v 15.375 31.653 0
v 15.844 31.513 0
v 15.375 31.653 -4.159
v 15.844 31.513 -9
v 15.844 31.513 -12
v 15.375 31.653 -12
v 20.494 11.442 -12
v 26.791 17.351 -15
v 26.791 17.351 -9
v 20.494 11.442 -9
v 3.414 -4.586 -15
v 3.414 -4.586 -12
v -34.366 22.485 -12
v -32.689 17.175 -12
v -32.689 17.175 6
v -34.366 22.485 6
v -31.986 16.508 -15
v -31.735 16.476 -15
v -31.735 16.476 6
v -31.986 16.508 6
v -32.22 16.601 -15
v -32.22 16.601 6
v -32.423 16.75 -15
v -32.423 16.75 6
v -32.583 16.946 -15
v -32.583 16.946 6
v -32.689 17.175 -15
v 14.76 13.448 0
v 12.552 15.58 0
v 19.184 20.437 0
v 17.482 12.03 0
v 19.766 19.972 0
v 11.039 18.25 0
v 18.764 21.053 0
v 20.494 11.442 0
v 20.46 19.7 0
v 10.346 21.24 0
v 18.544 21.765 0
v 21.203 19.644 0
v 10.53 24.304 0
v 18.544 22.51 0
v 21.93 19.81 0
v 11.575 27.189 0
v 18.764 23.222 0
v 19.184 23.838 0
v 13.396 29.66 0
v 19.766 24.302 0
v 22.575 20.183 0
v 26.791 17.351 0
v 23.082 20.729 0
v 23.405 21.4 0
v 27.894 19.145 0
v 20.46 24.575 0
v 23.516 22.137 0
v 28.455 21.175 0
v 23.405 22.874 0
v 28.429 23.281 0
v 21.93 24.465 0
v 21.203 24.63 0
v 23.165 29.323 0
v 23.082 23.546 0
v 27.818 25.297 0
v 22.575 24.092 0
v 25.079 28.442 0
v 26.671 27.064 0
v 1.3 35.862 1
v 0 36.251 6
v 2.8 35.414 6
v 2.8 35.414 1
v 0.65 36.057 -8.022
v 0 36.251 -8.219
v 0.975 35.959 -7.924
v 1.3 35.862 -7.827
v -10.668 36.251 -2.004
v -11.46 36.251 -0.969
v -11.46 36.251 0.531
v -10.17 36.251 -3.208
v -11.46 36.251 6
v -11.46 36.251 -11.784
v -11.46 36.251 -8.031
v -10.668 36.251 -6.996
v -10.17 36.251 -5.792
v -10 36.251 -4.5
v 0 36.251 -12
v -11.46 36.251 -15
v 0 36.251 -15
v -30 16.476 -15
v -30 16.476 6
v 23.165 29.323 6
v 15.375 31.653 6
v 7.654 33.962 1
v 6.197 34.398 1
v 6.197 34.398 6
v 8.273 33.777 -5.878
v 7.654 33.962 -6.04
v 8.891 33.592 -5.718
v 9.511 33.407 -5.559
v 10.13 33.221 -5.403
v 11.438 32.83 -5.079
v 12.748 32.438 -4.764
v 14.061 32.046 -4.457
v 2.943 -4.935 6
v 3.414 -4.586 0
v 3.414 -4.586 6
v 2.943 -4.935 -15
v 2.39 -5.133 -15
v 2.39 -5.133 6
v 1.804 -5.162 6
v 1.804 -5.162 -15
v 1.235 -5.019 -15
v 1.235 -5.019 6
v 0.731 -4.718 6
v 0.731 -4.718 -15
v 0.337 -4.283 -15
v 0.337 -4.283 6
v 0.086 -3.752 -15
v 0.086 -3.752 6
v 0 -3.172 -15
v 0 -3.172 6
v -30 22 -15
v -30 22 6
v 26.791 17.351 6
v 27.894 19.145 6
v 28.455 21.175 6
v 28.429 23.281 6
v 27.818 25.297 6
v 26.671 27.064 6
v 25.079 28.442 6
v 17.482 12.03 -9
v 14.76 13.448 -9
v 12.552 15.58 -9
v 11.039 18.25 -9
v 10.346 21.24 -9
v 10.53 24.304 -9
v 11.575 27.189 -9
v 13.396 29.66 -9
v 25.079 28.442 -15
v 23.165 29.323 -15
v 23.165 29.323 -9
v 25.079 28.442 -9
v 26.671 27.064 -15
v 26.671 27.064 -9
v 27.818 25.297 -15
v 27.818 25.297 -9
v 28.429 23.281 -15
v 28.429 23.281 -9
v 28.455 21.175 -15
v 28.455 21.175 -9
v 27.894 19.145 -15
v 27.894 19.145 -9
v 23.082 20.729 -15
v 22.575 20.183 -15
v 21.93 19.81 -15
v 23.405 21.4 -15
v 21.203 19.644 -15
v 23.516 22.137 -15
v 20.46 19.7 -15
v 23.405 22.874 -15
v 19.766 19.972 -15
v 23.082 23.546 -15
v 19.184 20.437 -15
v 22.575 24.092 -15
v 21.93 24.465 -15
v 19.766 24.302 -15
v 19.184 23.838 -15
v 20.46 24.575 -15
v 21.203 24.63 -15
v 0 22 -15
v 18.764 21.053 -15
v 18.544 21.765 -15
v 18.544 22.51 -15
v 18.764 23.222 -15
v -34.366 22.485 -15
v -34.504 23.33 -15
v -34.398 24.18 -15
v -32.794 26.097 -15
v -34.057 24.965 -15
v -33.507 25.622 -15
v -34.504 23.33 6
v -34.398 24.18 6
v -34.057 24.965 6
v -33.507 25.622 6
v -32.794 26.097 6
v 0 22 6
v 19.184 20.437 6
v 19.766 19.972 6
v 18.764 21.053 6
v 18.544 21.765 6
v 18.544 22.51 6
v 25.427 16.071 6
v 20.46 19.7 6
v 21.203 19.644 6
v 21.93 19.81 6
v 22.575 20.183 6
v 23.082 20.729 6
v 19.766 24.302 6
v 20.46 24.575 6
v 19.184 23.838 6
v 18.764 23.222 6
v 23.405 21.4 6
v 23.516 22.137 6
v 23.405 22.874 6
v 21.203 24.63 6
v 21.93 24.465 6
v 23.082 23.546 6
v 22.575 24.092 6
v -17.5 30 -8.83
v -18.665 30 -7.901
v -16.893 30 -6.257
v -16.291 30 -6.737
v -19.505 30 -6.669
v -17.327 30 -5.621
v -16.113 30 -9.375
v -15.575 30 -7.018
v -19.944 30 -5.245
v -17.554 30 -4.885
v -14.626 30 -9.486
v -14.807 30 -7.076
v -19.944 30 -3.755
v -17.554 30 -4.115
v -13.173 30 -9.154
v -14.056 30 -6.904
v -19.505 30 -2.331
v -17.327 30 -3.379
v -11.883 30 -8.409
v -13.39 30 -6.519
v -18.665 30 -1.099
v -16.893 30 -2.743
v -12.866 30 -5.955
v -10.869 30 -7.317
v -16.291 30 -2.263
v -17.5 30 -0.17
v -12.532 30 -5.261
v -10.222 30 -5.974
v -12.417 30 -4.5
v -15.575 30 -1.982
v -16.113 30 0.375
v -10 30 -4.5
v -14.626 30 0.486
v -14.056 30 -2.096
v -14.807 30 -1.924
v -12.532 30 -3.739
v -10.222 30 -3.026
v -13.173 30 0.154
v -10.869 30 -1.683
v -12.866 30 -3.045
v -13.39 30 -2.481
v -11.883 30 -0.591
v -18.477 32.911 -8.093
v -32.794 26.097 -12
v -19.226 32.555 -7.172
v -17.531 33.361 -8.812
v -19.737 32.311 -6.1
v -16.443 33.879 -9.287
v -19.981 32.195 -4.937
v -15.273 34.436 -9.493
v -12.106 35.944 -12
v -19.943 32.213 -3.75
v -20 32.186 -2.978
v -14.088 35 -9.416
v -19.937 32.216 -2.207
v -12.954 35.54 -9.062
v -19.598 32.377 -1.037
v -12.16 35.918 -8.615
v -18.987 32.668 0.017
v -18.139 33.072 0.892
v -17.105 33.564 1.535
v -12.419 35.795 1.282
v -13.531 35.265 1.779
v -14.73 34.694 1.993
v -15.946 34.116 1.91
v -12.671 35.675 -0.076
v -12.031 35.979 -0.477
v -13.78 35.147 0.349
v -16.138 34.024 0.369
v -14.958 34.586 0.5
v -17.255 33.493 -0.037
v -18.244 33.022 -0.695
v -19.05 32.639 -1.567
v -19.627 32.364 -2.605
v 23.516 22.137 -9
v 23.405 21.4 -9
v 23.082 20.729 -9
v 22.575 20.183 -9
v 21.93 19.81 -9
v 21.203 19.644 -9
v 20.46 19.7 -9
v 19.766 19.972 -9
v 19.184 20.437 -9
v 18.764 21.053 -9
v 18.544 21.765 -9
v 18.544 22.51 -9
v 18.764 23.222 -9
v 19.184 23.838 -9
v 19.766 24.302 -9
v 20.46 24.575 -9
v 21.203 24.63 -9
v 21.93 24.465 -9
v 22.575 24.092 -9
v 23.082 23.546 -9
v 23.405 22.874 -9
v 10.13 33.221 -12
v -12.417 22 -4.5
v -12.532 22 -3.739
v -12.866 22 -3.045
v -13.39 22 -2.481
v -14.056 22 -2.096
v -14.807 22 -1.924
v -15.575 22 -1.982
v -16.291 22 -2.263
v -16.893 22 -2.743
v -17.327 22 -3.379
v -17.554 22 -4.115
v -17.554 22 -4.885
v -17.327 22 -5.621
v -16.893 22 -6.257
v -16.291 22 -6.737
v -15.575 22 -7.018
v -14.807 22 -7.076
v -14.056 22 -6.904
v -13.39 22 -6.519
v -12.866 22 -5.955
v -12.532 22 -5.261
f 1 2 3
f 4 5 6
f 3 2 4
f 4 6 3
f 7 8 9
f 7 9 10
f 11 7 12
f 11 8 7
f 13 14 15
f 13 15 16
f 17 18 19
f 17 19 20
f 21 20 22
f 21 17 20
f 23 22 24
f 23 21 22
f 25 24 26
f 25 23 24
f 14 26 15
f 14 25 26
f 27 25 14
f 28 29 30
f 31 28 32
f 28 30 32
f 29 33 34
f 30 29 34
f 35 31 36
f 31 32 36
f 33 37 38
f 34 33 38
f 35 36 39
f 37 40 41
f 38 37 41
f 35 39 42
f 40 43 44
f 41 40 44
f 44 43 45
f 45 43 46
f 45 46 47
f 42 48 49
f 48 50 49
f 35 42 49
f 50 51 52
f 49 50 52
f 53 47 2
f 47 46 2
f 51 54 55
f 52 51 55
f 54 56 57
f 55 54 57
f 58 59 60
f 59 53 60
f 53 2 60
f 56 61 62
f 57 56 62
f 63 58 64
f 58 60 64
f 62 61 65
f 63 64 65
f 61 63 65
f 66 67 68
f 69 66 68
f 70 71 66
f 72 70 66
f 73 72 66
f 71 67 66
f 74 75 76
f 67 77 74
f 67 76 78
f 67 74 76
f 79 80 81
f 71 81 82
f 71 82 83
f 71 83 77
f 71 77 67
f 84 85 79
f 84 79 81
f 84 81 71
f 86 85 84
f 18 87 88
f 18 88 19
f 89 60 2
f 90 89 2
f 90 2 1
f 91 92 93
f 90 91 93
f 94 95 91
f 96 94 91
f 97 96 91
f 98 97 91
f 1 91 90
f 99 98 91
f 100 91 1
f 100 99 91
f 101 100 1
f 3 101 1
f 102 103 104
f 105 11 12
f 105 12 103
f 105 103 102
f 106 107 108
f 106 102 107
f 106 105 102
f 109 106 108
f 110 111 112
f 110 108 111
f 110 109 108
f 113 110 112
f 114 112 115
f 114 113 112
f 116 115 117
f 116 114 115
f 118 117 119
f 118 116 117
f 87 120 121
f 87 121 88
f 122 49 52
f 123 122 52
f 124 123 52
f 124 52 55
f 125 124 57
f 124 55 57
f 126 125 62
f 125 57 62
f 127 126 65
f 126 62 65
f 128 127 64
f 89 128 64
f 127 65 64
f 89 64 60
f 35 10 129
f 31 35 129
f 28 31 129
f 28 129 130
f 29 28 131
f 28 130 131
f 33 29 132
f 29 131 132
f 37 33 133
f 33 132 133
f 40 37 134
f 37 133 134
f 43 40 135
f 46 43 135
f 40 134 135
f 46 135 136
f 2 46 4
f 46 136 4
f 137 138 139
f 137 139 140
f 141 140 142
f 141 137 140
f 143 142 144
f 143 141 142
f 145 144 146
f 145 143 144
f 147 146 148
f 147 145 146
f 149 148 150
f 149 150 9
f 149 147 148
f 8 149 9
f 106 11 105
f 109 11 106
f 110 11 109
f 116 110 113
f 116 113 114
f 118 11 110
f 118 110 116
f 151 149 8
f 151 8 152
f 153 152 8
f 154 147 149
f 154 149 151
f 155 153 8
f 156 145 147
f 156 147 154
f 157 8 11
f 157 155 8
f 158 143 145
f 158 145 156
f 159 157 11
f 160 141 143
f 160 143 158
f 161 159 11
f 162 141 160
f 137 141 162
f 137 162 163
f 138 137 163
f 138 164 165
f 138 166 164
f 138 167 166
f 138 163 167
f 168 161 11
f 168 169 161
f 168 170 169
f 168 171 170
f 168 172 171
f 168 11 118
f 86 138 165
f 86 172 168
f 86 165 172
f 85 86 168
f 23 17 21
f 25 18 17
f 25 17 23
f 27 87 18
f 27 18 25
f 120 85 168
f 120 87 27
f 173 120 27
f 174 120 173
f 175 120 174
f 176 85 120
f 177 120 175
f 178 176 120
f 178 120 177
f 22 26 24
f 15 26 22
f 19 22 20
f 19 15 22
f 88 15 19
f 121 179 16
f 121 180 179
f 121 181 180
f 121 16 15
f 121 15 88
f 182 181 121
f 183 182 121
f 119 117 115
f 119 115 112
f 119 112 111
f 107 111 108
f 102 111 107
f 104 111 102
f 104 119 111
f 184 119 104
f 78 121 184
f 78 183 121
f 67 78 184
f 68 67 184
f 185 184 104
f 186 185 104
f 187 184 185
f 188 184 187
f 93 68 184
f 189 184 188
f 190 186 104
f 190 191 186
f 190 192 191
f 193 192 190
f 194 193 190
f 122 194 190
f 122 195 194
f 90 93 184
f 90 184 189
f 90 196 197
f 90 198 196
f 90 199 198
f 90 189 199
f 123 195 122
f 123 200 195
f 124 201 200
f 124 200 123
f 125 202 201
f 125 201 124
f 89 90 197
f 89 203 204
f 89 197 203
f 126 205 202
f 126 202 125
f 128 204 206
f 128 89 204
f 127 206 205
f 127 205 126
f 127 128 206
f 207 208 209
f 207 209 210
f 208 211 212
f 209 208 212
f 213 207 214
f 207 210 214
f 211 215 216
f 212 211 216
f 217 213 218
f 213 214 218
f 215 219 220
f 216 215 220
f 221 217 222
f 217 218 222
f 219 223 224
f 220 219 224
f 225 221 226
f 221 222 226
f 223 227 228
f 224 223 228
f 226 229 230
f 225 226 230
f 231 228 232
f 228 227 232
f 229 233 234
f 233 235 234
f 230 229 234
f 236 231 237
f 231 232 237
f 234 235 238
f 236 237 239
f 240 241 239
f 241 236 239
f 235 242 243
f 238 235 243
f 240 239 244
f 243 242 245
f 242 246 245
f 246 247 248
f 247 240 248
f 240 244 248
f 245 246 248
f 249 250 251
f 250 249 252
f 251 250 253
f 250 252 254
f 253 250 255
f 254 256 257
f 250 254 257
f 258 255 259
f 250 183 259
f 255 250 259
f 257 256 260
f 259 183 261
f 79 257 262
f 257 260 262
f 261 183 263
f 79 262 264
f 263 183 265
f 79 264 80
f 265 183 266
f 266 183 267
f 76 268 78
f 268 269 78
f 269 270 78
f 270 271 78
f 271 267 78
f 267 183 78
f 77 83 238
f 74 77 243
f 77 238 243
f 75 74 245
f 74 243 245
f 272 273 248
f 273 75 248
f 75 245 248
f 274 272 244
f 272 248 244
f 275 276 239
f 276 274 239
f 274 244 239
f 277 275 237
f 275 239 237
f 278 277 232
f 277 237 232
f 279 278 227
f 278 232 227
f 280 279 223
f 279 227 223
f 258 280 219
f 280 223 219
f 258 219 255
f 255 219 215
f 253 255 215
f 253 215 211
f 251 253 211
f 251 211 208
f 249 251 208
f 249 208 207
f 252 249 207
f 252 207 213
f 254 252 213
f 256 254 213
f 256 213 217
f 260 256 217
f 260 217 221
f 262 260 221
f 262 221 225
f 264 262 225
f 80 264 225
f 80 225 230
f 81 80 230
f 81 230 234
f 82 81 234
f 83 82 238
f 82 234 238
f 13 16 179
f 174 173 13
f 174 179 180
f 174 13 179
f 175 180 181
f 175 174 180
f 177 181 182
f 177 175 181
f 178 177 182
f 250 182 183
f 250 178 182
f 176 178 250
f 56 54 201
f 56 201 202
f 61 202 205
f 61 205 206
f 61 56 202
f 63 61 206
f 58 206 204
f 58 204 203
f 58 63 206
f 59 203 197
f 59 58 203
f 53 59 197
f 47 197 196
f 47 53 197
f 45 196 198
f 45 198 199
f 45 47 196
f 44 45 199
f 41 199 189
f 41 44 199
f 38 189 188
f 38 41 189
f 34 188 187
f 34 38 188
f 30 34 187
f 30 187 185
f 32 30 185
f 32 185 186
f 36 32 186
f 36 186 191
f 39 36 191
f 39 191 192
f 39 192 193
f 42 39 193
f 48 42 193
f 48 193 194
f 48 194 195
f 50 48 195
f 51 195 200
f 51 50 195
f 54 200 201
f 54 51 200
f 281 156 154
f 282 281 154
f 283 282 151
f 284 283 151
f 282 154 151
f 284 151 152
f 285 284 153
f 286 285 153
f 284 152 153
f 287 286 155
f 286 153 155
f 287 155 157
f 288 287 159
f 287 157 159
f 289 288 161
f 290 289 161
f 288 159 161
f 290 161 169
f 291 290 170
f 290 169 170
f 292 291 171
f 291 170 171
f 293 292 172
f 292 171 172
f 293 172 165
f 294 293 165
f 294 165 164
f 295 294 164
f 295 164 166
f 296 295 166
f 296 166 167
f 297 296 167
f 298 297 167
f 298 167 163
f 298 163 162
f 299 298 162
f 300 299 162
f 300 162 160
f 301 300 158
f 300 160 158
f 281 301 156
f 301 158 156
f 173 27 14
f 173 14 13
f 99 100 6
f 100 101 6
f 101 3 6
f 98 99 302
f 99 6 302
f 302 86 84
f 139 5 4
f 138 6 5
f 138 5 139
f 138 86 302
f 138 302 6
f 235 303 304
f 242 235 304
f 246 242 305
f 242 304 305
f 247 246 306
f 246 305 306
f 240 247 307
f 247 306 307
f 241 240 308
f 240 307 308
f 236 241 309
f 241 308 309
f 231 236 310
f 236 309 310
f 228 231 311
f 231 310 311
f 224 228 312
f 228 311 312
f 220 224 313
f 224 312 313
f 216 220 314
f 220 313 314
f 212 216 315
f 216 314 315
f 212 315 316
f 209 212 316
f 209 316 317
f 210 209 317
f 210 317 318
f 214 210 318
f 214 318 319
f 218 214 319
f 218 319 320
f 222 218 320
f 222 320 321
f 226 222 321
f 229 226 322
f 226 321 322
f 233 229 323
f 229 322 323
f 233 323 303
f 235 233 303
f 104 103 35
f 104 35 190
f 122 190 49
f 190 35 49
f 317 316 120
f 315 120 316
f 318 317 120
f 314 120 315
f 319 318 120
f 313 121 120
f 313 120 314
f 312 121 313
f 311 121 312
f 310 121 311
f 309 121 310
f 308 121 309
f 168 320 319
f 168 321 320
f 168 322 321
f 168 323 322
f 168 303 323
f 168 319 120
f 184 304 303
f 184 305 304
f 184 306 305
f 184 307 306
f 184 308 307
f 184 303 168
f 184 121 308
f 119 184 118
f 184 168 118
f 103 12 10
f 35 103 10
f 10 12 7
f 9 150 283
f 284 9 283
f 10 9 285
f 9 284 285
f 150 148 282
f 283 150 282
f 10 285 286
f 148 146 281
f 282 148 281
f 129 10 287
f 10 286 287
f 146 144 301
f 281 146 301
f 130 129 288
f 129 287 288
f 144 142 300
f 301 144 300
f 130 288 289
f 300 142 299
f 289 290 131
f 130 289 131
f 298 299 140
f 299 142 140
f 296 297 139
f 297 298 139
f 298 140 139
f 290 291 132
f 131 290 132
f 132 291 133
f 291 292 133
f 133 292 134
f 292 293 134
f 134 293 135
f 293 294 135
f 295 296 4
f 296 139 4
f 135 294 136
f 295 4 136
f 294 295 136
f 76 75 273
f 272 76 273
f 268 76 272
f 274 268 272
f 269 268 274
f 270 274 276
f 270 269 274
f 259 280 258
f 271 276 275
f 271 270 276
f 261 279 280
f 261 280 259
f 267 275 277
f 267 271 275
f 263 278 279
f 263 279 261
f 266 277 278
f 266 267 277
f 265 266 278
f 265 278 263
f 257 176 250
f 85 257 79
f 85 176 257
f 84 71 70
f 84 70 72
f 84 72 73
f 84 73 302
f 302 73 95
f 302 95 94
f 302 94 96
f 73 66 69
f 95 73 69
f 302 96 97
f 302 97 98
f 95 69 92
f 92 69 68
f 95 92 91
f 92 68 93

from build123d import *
from build123d.topology import SkipClean

# Parameters (mm, degrees)
RESSALTO_EXTRUS_O1_DEPTH     = 6
RESSALTO_EXTRUS_O2_DEPTH     = 47.171573
CORTE_EXTRUS_O1_START        = -36
CORTE_EXTRUS_O1_DEPTH        = 36
CORTE_EXTRUS_O2_START        = -6
CORTE_EXTRUS_O2_DEPTH        = 6
CORTE_EXTRUS_O3_DEPTH        = 64.000000167
ESBO_O6_R                    = 2.75
CORTE_EXTRUS_O4_DEPTH        = 54.872946739
ESBO_O7_R                    = 5
CORTE_EXTRUS_O5_DEPTH        = 16
RESSALTO_EXTRUS_O3_DEPTH     = 56
CORTE_EXTRUS_O6_DEPTH        = 56
ESBO_O10_W                   = 30
ESBO_O10_H                   = 4.954017116
CORTE_EXTRUS_O7_DEPTH        = 56
ESBO_O11_W                   = 2.729993951
ESBO_O11_H                   = 30
CORTE_EXTRUS_O8_DEPTH        = 56
ESBO_O12_W                   = 4.187219241
ESBO_O12_H                   = 30
CORTE_EXTRUS_O9_DEPTH        = 56
ESBO_O13_R                   = 7.968110823
CORTE_EXTRUS_O10_DEPTH       = 56
FILETE1_R                    = 3
CORTE_EXTRUS_O11_OUTLINE_R   = 5
CORTE_EXTRUS_O11_DEPTH       = 11.574929357
CORTE_EXTRUS_O11_START       = -21
CORTE_EXTRUS_O11_2_DEPTH     = 28
CORTE_EXTRUS_O12_DEPTH       = 65.838260479
ESBO_O16_R                   = 2.5
RESSALTO_EXTRUS_O4_DEPTH     = 6
RESSALTO_EXTRUS_O5_DEPTH     = 32
CORTE_EXTRUS_O13_DEPTH       = 68.468511346
CORTE_EXTRUS_O13_DEPTH_BACK  = 68.468511346
RESSALTO_EXTRUS_O6_START     = -12
RESSALTO_EXTRUS_O6_OUTLINE_R = 2.5
RESSALTO_EXTRUS_O6_DEPTH     = 6
CORTE_EXTRUS_O14_START       = -6
CORTE_EXTRUS_O14_DEPTH       = 6
RESSALTO_EXTRUS_O7_START     = 12
RESSALTO_EXTRUS_O7_DEPTH     = 12
ESBO_O22_R                   = 45.252609104
CORTE_EXTRUS_O15_DEPTH       = 12
RESSALTO_EXTRUS_O8_START     = 6
ESBO_O23_R                   = 2.5
RESSALTO_EXTRUS_O8_DEPTH     = 6
RESSALTO_EXTRUS_O9_DEPTH     = 6
RESSALTO_EXTRUS_O10_REACH    = 56.275
ESBO_O26_R                   = 5
CORTE_EXTRUS_O16_DEPTH       = 47.409919189
ESBO_O27_R                   = 5
ESBO_O27_R_2                 = 2.582746485
RESSALTO_EXTRUS_O11_DEPTH    = 8


with BuildPart() as part:
    # Esboço1 → Ressalto-extrusão1 (new body)
    with BuildSketch(Plane.XY):
        with BuildLine():
            Line((-30, 24), (-2.375117905, 40.574929257))
            ThreePointArc((-2.375117905, 40.574929257), (0.100503831, 41.637149282), (2.769839649, 42))
            Line((2.769839649, 42), (40, 42))
            ThreePointArc((40, 42), (41.414213562, 41.414213562), (42, 40))
            Line((42, 40), (42, 34.828427125))
            ThreePointArc((42, 34.828427125), (41.847759065, 34.06306026), (41.414213562, 33.414213562))
            Line((41.414213562, 33.414213562), (36.670641482, 28.670641482))
            ThreePointArc((36.670641482, 28.670641482), (31.432958847, 25.911210894), (25.552715472, 26.597151419))
            ThreePointArc((25.552715472, 26.597151419), (13.045048712, 24.264475098), (10.712372391, 11.756808337))
            ThreePointArc((10.712372391, 11.756808337), (11.398312916, 5.876564962), (8.638882328, 0.638882328))
            Line((8.638882328, 0.638882328), (8, 0))
            Line((8, 0), (6.2, -1.8))
            Line((6.2, -1.8), (3.414213562, -4.585786438))
            ThreePointArc((3.414213562, -4.585786438), (1.234633135, -5.01933194), (0, -3.171572875))
            Line((0, -3.171572875), (0, 0))
            Line((0, 0), (0, 22))
            Line((0, 22), (-30, 22))
            Line((-30, 22), (-30, 24))
        make_face()
        with BuildLine():
            Line((6.2, 37.5), (6.2, 34.5))
            ThreePointArc((6.2, 34.5), (4.5, 32.8), (2.8, 34.5))
            Line((2.8, 34.5), (2.8, 37.5))
            ThreePointArc((2.8, 37.5), (4.5, 39.2), (6.2, 37.5))
        make_face(mode=Mode.SUBTRACT)
        with BuildLine():
            Line((39.2, 37.5), (39.2, 35.5))
            ThreePointArc((39.2, 35.5), (37.5, 33.8), (35.8, 35.5))
            Line((35.8, 35.5), (35.8, 37.5))
            ThreePointArc((35.8, 37.5), (37.5, 39.2), (39.2, 37.5))
        make_face(mode=Mode.SUBTRACT)
        with BuildLine():
            Line((6.2, 3.5), (6.2, 1.5))
            ThreePointArc((6.2, 1.5), (4.5, -0.2), (2.8, 1.5))
            Line((2.8, 1.5), (2.8, 3.5))
            ThreePointArc((2.8, 3.5), (4.5, 5.2), (6.2, 3.5))
        make_face(mode=Mode.SUBTRACT)
    extrude(amount=RESSALTO_EXTRUS_O1_DEPTH)

    # Esboço2 → Ressalto-extrusão2 (add, through all)
    with BuildSketch(Plane(origin=(0, 42, 0), x_dir=(1, 0, 0), z_dir=(0, 1, 0))):
        with BuildLine():
            Line((-30, 0), (-30, 20))
            ThreePointArc((-30, 20), (5.092783278, 6.734019802), (42, 0))
            Line((42, 0), (-30, 0))
        make_face()
    extrude(amount=-RESSALTO_EXTRUS_O2_DEPTH)

    # Esboço3 → Corte-extrusão1 (cut)
    with BuildSketch(Plane.XY.offset(CORTE_EXTRUS_O1_START)):
        with BuildLine():
            ThreePointArc((2.8, 34.5), (4.5, 32.8), (6.2, 34.5))
            Line((6.2, 34.5), (6.2, 37.5))
            ThreePointArc((6.2, 37.5), (4.5, 39.2), (2.8, 37.5))
            Line((2.8, 37.5), (2.8, 34.5))
        make_face()
        with BuildLine():
            Line((0, -3.171572875), (0, 22))
            Line((0, 22), (-30, 22))
            Line((-30, 22), (-30, -5.171572875))
            Line((-30, -5.171572875), (2, -5.171572875))
            ThreePointArc((2, -5.171572875), (0.585786438, -4.585786438), (0, -3.171572875))
        make_face()
        with BuildLine():
            ThreePointArc((3.414213562, -4.585786438), (2.765366865, -5.01933194), (2, -5.171572875))
            Line((2, -5.171572875), (42, -5.171572875))
            Line((42, -5.171572875), (42, 34.828427125))
            ThreePointArc((42, 34.828427125), (41.847759065, 34.06306026), (41.414213562, 33.414213562))
            Line((41.414213562, 33.414213562), (36.670641482, 28.670641482))
            ThreePointArc((36.670641482, 28.670641482), (31.432958847, 25.911210894), (25.552715472, 26.597151419))
            ThreePointArc((25.552715472, 26.597151419), (13.045048712, 24.264475098), (10.712372391, 11.756808337))
            ThreePointArc((10.712372391, 11.756808337), (11.398312916, 5.876564962), (8.638882328, 0.638882328))
            Line((8.638882328, 0.638882328), (3.414213562, -4.585786438))
        make_face()
        with BuildLine():
            ThreePointArc((35.8, 35.5), (37.5, 33.8), (39.2, 35.5))
            Line((39.2, 35.5), (39.2, 37.5))
            ThreePointArc((39.2, 37.5), (37.5, 39.2), (35.8, 37.5))
            Line((35.8, 37.5), (35.8, 35.5))
        make_face()
        with BuildLine():
            ThreePointArc((2.8, 1.5), (4.5, -0.2), (6.2, 1.5))
            Line((6.2, 1.5), (6.2, 3.5))
            ThreePointArc((6.2, 3.5), (4.5, 5.2), (2.8, 3.5))
            Line((2.8, 3.5), (2.8, 1.5))
        make_face()
        with BuildLine():
            Line((-30, 42), (-30, 24))
            Line((-30, 24), (-2.375117905, 40.574929257))
            ThreePointArc((-2.375117905, 40.574929257), (0.100503831, 41.637149282), (2.769839649, 42))
            Line((2.769839649, 42), (-30, 42))
        make_face()
    extrude(amount=CORTE_EXTRUS_O1_DEPTH, mode=Mode.SUBTRACT)

    # Esboço4 → Corte-extrusão2 (cut)
    with BuildSketch(Plane.XY.offset(CORTE_EXTRUS_O2_START)):
        with BuildLine():
            Line((42, 40), (42, 42))
            Line((42, 42), (40, 42))
            ThreePointArc((40, 42), (41.414213562, 41.414213562), (42, 40))
        make_face()
    extrude(amount=CORTE_EXTRUS_O2_DEPTH, mode=Mode.SUBTRACT)

    # Esboço5 → Corte-extrusão3 (cut, through all)
    with BuildSketch(Plane.XY.offset(1)):
        with BuildLine():
            Line((1.3, 37.5), (1.3, 34.5))
            ThreePointArc((1.3, 34.5), (4.5, 31.3), (7.7, 34.5))
            Line((7.7, 34.5), (7.7, 37.5))
            ThreePointArc((7.7, 37.5), (4.5, 40.7), (1.3, 37.5))
        make_face()
        with BuildLine():
            Line((40.2, 35.5), (40.2, 37.5))
            ThreePointArc((40.2, 37.5), (37.5, 40.2), (34.8, 37.5))
            Line((34.8, 37.5), (34.8, 35.5))
            ThreePointArc((34.8, 35.5), (37.5, 32.8), (40.2, 35.5))
        make_face()
        with BuildLine():
            Line((1.8, 3.5), (1.8, 1.5))
            ThreePointArc((1.8, 1.5), (4.5, -1.2), (7.2, 1.5))
            Line((7.2, 1.5), (7.2, 3.5))
            ThreePointArc((7.2, 3.5), (4.5, 6.2), (1.8, 3.5))
        make_face()
    extrude(amount=-CORTE_EXTRUS_O3_DEPTH, mode=Mode.SUBTRACT)

    # Esboço6 → Corte-extrusão4 (cut, through all)
    with BuildSketch(Plane.XZ.offset(-22)):
        with Locations((-15, -3)):
            Circle(ESBO_O6_R)
    extrude(amount=-CORTE_EXTRUS_O4_DEPTH, mode=Mode.SUBTRACT)

    # Esboço7 → Corte-extrusão5 (cut)
    with BuildSketch(Plane(origin=(0, 29, 0), x_dir=(-1, 0, 0), z_dir=(0, -1, 0))):
        with Locations(Location((15, 3, 0), (0, 0, 180))):
            Circle(ESBO_O7_R)
    extrude(amount=-CORTE_EXTRUS_O5_DEPTH, mode=Mode.SUBTRACT)

    # Esboço8 → Ressalto-extrusão3 (add)
    with BuildSketch(Plane.XY.offset(6)):
        Polygon((-30, 22), (-30, 16.475897374), (-32.468121282, 16.475897374), (-35.151943697, 24.974668355), (-2.375117905, 40.574929257), align=None)
    extrude(amount=-RESSALTO_EXTRUS_O3_DEPTH)

    # Esboço9 → Corte-extrusão6 (cut)
    with BuildSketch(Plane(origin=(-19.527562648, 29.041651157, 0), x_dir=(0.8298484461977135, 0.5579888496585221, 0), z_dir=(0.5579888496585221, -0.8298484461977135, 0))):
        with BuildLine():
            Line((20.669370198, -50), (20.669370198, -8.960218673))
            add(Edge.make_bspline(
                [(20.669370198, -8.960218673), (3.547051305, -13.487974371), (-12.619698693, -20)],
                knots=[1.879279318, 1.879279318, 1.879279318, 2.02269118, 2.02269118, 2.02269118], degree=2, weights=[1, 0.997430231, 1]))
            Line((-12.619698693, -20), (-12.619698693, -50))
            Line((-12.619698693, -50), (20.669370198, -50))
        make_face()
    extrude(amount=-CORTE_EXTRUS_O6_DEPTH, mode=Mode.SUBTRACT)

    # Esboço10 → Corte-extrusão7 (cut)
    with BuildSketch(Plane(origin=(-10.472437352, -7.041651157, 0), x_dir=(0, 0, -1), z_dir=(0.8298484461977135, 0.5579888496585221, 1.5073885260129385e-15))):
        with Locations((35, 37.473339864)):
            Rectangle(ESBO_O10_W, ESBO_O10_H)
    extrude(amount=-CORTE_EXTRUS_O7_DEPTH, mode=Mode.SUBTRACT)

    # Esboço11 → Corte-extrusão8 (cut)
    with BuildSketch(Plane(origin=(-22.291848959, 33.152734563, 0), x_dir=(0.8298484461977135, 0.5579888496585221, 0), z_dir=(0.5579888496585221, -0.8298484461977135, 0))):
        with Locations((-13.984695669, -35)):
            Rectangle(ESBO_O11_W, ESBO_O11_H)
    extrude(amount=-CORTE_EXTRUS_O8_DEPTH, mode=Mode.SUBTRACT)

    # Esboço12 → Corte-extrusão9 (cut)
    with BuildSketch(Plane(origin=(-19.527562648, 29.041651157, 0), x_dir=(0.8298484461977135, 0.5579888496585221, 0), z_dir=(-0.5579888496585221, 0.8298484461977135, 0))):
        with Locations((-14.713308314, 35)):
            Rectangle(ESBO_O12_W, ESBO_O12_H)
    extrude(amount=-CORTE_EXTRUS_O9_DEPTH, mode=Mode.SUBTRACT)

    # Esboço13 → Corte-extrusão10 (cut)
    with BuildSketch(Plane(origin=(0, 0, -20), x_dir=(-1, 0, 0), z_dir=(0, 0, -1))):
        with Locations((34.361612589, 20.650995678)):
            Circle(ESBO_O13_R)
    extrude(amount=CORTE_EXTRUS_O10_DEPTH, mode=Mode.SUBTRACT)

    # Filete1
    filete1_edges = [part.edges().sort_by_distance(p)[0] for p in [
        (-35.151943697, 24.974668355, -7),
    ]]
    fillet(filete1_edges, radius=FILETE1_R)

    # Corte-extrusão11: read off the stored shape, not the designer's step
    # Corte-extrusão11 outline → Corte-extrusão11 (cut)
    with SkipClean():  # the faces are left unmerged after this step: merging them gives an invalid solid
        with BuildSketch(Plane(origin=(0, 29, 0), x_dir=(1, 0, 0), z_dir=(0, 1, 0))):
            with Locations((-15, 3)):
                Circle(CORTE_EXTRUS_O11_OUTLINE_R)
        extrude(amount=CORTE_EXTRUS_O11_DEPTH, mode=Mode.SUBTRACT)

    # Corte-extrus_o11 2 outline → Corte-extrus_o11 2 (cut)
    with SkipClean():  # the faces are left unmerged after this step: merging them gives an invalid solid
        with BuildSketch(Plane.XY.offset(CORTE_EXTRUS_O11_START)):
            with BuildLine():
                ThreePointArc((-31.735233974, 16.475897374), (-32.326363669, 16.669320853), (-32.688816639, 17.174766006))
                Line((-32.688816639, 17.174766006), (-32.468121282, 16.475897374))
                Line((-32.468121282, 16.475897374), (-31.735233974, 16.475897374))
            make_face()
        extrude(amount=CORTE_EXTRUS_O11_2_DEPTH, mode=Mode.SUBTRACT)

    # Esboço15 → Corte-extrusão12 (cut, through all)
    with SkipClean():  # the faces are left unmerged after this step: merging them gives an invalid solid
        with BuildSketch(Plane.XY.offset(6)):
            with BuildLine():
                Line((9.75, 16.30952381), (10, 22.2))
                ThreePointArc((10, 22.2), (16.149553965, 32.072850311), (27.722395139, 30.906859571))
                ThreePointArc((27.722395139, 30.906859571), (33.400143909, 29.493959096), (39.042427522, 31.042427522))
                Line((39.042427522, 31.042427522), (40.056737405, 6.935592927))
                Line((40.056737405, 6.935592927), (14.498143353, 9.675700977))
                Line((14.498143353, 9.675700977), (9.75, 16.30952381))
            make_face()
        extrude(amount=-CORTE_EXTRUS_O12_DEPTH, mode=Mode.SUBTRACT)

    # Esboço16 → Ressalto-extrusão4 (add)
    # profile 1 of 2: a face of its own
    with SkipClean():  # the faces are left unmerged after this step: merging them gives an invalid solid
        with BuildSketch(Plane.XY.offset(6)):
            with BuildLine():
                Line((8.638882328, 0.638882328), (3.414213562, -4.585786438))
                Line((3.414213562, -4.585786438), (25.426690476, 16.071039138))
                Line((25.426690476, 16.071039138), (26.790546671, 17.350901447))
                ThreePointArc((26.790546671, 17.350901447), (28.194594299, 24.31086023), (23.165446705, 29.322850901))
                Line((23.165446705, 29.322850901), (15.374722386, 31.652843581))
                ThreePointArc((15.374722386, 31.652843581), (11.437624412, 27.637000379), (10, 22.2))
                Line((10, 22.2), (9.79045574, 17.262738097))
                ThreePointArc((9.79045574, 17.262738097), (9.904464176, 14.45167969), (10.712372391, 11.756808337))
                ThreePointArc((10.712372391, 11.756808337), (11.398312916, 5.876564962), (8.638882328, 0.638882328))
            make_face()
            with Locations((21.016451551, 22.137322401)):
                Circle(ESBO_O16_R, mode=Mode.SUBTRACT)
        # profile 2 of 2: a face of its own
        with BuildSketch(Plane.XY.offset(6)):
            with BuildLine():
                ThreePointArc((0, -3.171572875), (1.234633135, -5.01933194), (3.414213562, -4.585786438))
                Line((3.414213562, -4.585786438), (8.638882328, 0.638882328))
                ThreePointArc((8.638882328, 0.638882328), (11.398312916, 5.876564962), (10.712372391, 11.756808337))
                ThreePointArc((10.712372391, 11.756808337), (9.904464176, 14.45167969), (9.79045574, 17.262738097))
                Line((9.79045574, 17.262738097), (10, 22.2))
                ThreePointArc((10, 22.2), (11.437624412, 27.637000379), (15.374722386, 31.652843581))
                Line((15.374722386, 31.652843581), (6.196917621, 34.397674105))
                ThreePointArc((6.196917621, 34.397674105), (4.448813845, 32.80077077), (2.8, 34.5))
                Line((2.8, 34.5), (2.8, 35.413599309))
                Line((2.8, 35.413599309), (0, 36.251002769))
                Line((0, 36.251002769), (-11.459875276, 36.251002769))
                Line((-11.459875276, 36.251002769), (-32.794151025, 26.096869176))
                ThreePointArc((-32.794151025, 26.096869176), (-34.255821628, 24.584817567), (-34.365620501, 22.484644901))
                Line((-34.365620501, 22.484644901), (-32.688816639, 17.174766006))
                ThreePointArc((-32.688816639, 17.174766006), (-32.326363669, 16.669320853), (-31.735233974, 16.475897374))
                Line((-31.735233974, 16.475897374), (-30, 16.475897374))
                Line((-30, 16.475897374), (-30, 22))
                Line((-30, 22), (0, 22))
                Line((0, 22), (0, -3.171572875))
            make_face()
            with BuildLine():
                Line((2.8, 1.5), (2.8, 3.5))
                ThreePointArc((2.8, 3.5), (4.5, 5.2), (6.2, 3.5))
                Line((6.2, 3.5), (6.2, 1.5))
                ThreePointArc((6.2, 1.5), (4.5, -0.2), (2.8, 1.5))
            make_face(mode=Mode.SUBTRACT)
        extrude(amount=RESSALTO_EXTRUS_O4_DEPTH)

    # Esboço17 → Ressalto-extrusão5 (add, through all)
    with SkipClean():  # the faces are left unmerged after this step: merging them gives an invalid solid
        with BuildSketch(Plane.XY.offset(12)):
            Polygon((0, 36.251002769), (10.130318386, 33.221301458), (0.975035889, 28.870604343), align=None)
            Polygon((2.084047032, 8.037037864), (2.084047032, -2.498567998), (9.054974219, 1.541401167), (7.781094017, 11.183860023), align=None)
        extrude(amount=-RESSALTO_EXTRUS_O5_DEPTH)

    # Esboço18 → Corte-extrusão13 (cut, two sides: drawn at the far end of the back side and taken through both)
    with BuildSketch(Plane.XY.offset(12).offset(-CORTE_EXTRUS_O13_DEPTH_BACK)):
        Polygon((46.622494025, 46.314856478), (-12.491527995, 46.314856478), (-11.459875276, 36.251002769), (0, 36.251002769), (23.165446705, 29.322850901), (57.534604201, 23.388039005), align=None)
    extrude(amount=CORTE_EXTRUS_O13_DEPTH + CORTE_EXTRUS_O13_DEPTH_BACK, mode=Mode.SUBTRACT)

    # Ressalto-extrusão6: read off the stored shape, not the designer's step
    # Ressalto-extrusão6 outline → Ressalto-extrusão6 (add)
    # profile 1 of 4: a face of its own
    with BuildSketch(Plane.XY.offset(12).offset(RESSALTO_EXTRUS_O6_START)):
        with BuildLine():
            Line((6.920981451, 0.304655358), (4.333572344, -1.194865829))
            ThreePointArc((4.333572344, -1.194865829), (5.853844213, -0.836044916), (6.920981451, 0.304655358))
        make_face()
    # profile 2 of 4: a face of its own
    with BuildSketch(Plane.XY.offset(12).offset(RESSALTO_EXTRUS_O6_START)):
        with BuildLine():
            Line((2.084047032, 0.294524468), (2.084047032, 4.705475532))
            ThreePointArc((2.084047032, 4.705475532), (1.871970984, 4.119244292), (1.8, 3.5))
            Line((1.8, 3.5), (1.8, 1.5))
            ThreePointArc((1.8, 1.5), (1.871970984, 0.880755708), (2.084047032, 0.294524468))
        make_face()
    # profile 3 of 4: a face of its own
    with BuildSketch(Plane.XY.offset(12).offset(RESSALTO_EXTRUS_O6_START)):
        with BuildLine():
            Line((10, 22.2), (9.79045574, 17.262738097))
            ThreePointArc((9.79045574, 17.262738097), (9.904464176, 14.45167969), (10.712372391, 11.756808337))
            ThreePointArc((10.712372391, 11.756808337), (11.398312916, 5.876564962), (8.638882328, 0.638882328))
            Line((8.638882328, 0.638882328), (3.414213562, -4.585786438))
            Line((3.414213562, -4.585786438), (26.790546671, 17.350901447))
            ThreePointArc((26.790546671, 17.350901447), (28.194594299, 24.31086023), (23.165446705, 29.322850901))
            Line((23.165446705, 29.322850901), (15.374722386, 31.652843581))
            ThreePointArc((15.374722386, 31.652843581), (11.437624412, 27.637000379), (10, 22.2))
        make_face()
        with Locations((21.016451551, 22.137322401)):
            Circle(RESSALTO_EXTRUS_O6_OUTLINE_R, mode=Mode.SUBTRACT)
    # profile 4 of 4: a face of its own
    with BuildSketch(Plane.XY.offset(12).offset(RESSALTO_EXTRUS_O6_START)):
        Polygon((-11, 36.251002769), (-11.459875276, 36.251002769), (-11.767511755, 29), (-11, 29), align=None)
    extrude(amount=RESSALTO_EXTRUS_O6_DEPTH)

    # Esboço20 → Corte-extrusão14 (cut)
    with BuildSketch(Plane.XY.offset(12).offset(CORTE_EXTRUS_O14_START)):
        with BuildLine():
            Line((-30, 22), (0, 22))
            Line((0, 22), (0, -3.171572875))
            ThreePointArc((0, -3.171572875), (1.234633135, -5.01933194), (3.414213562, -4.585786438))
            Line((3.414213562, -4.585786438), (26.790546671, 17.350901447))
            ThreePointArc((26.790546671, 17.350901447), (28.194594299, 24.31086023), (23.165446705, 29.322850901))
            Line((23.165446705, 29.322850901), (0, 36.251002769))
            Line((0, 36.251002769), (-11.459875276, 36.251002769))
            Line((-11.459875276, 36.251002769), (-32.794151025, 26.096869176))
            ThreePointArc((-32.794151025, 26.096869176), (-34.255821628, 24.584817567), (-34.365620501, 22.484644901))
            Line((-34.365620501, 22.484644901), (-32.688816639, 17.174766006))
            ThreePointArc((-32.688816639, 17.174766006), (-32.326363669, 16.669320853), (-31.735233974, 16.475897374))
            Line((-31.735233974, 16.475897374), (-30, 16.475897374))
            Line((-30, 16.475897374), (-30, 22))
        make_face()
    extrude(amount=CORTE_EXTRUS_O14_DEPTH, mode=Mode.SUBTRACT)

    # Esboço21 → Ressalto-extrusão7 (add)
    with BuildSketch(Plane(origin=(0, 0, 0), x_dir=(-1, 0, 0), z_dir=(0, 0, -1)).offset(RESSALTO_EXTRUS_O7_START)):
        with BuildLine():
            Line((-3.414213562, -4.585786438), (-20.494190423, 11.442310001))
            ThreePointArc((-20.494190423, 11.442310001), (-10.585084019, 19.720171533), (-15.84350344, 31.512643982))
            Line((-15.84350344, 31.512643982), (-15.374722386, 31.652843581))
            Line((-15.374722386, 31.652843581), (-10.130318386, 33.221301458))
            Line((-10.130318386, 33.221301458), (0, 36.251002769))
            Line((0, 36.251002769), (-3.414213562, 20.694771015))
            Line((-3.414213562, 20.694771015), (0, -3.171572875))
            ThreePointArc((0, -3.171572875), (-1.234633135, -5.01933194), (-3.414213562, -4.585786438))
        make_face()
    extrude(amount=-RESSALTO_EXTRUS_O7_DEPTH)

    # Esboço22 → Corte-extrusão15 (cut)
    with BuildSketch(Plane(origin=(0, 0, -12), x_dir=(-1, 0, 0), z_dir=(0, 0, -1))):
        with Locations((-6.010824173, 18.47613929)):
            Circle(ESBO_O22_R)
    extrude(amount=CORTE_EXTRUS_O15_DEPTH, mode=Mode.SUBTRACT)

    # Esboço23 → Ressalto-extrusão8 (add)
    with BuildSketch(Plane(origin=(0, 0, -9), x_dir=(-1, 0, 0), z_dir=(0, 0, -1)).offset(RESSALTO_EXTRUS_O8_START)):
        with BuildLine():
            Line((30, 22), (30, 16.475897374))
            Line((30, 16.475897374), (31.735233974, 16.475897374))
            ThreePointArc((31.735233974, 16.475897374), (32.326363669, 16.669320853), (32.688816639, 17.174766006))
            Line((32.688816639, 17.174766006), (34.365620501, 22.484644901))
            ThreePointArc((34.365620501, 22.484644901), (34.255821628, 24.584817567), (32.794151025, 26.096869176))
            Line((32.794151025, 26.096869176), (11.459875276, 36.251002769))
            Line((11.459875276, 36.251002769), (0, 36.251002769))
            Line((0, 36.251002769), (-23.165446705, 29.322850901))
            ThreePointArc((-23.165446705, 29.322850901), (-28.194594299, 24.31086023), (-26.790546671, 17.350901447))
            Line((-26.790546671, 17.350901447), (-3.414213562, -4.585786438))
            ThreePointArc((-3.414213562, -4.585786438), (-1.234633135, -5.01933194), (0, -3.171572875))
            Line((0, -3.171572875), (0, 22))
            Line((0, 22), (30, 22))
        make_face()
        with Locations(Location((-21.016451551, 22.137322401, 0), (0, 0, 180))):
            Circle(ESBO_O23_R, mode=Mode.SUBTRACT)
    extrude(amount=-RESSALTO_EXTRUS_O8_DEPTH)

    # Esboço24 → Ressalto-extrusão9 (add)
    with BuildSketch(Plane.XY.offset(-9)):
        Polygon((-2.499823115, 36.251002769), (-2.499823115, 22), (0, 22), (0, -3.171572875), (3.414213562, 20.694771015), (1.558919926, 29.148072853), (0.975035889, 28.870604343), (0, 36.251002769), align=None)
    extrude(amount=RESSALTO_EXTRUS_O9_DEPTH)

    # Esboço25 → Ressalto-extrusão10 (add, up to next)
    with BuildSketch(Plane.XY.offset(6), mode=Mode.PRIVATE) as ressalto_extrus_o10_sk1:
        Polygon((-26.355097468, 22), (-3.712003094, 22), (-3.712003094, 36.251002769), (-11.459875276, 36.251002769), (-28.142320243, 28.310926582), align=None)
    ressalto_extrus_o10_tool1 = extrude(ressalto_extrus_o10_sk1.sketch, amount=-RESSALTO_EXTRUS_O10_REACH, mode=Mode.PRIVATE) - part.part
    add(ressalto_extrus_o10_tool1.solids().sort_by_distance((-14.094848, 28.154372, 6))[0])

    # Esboço26 → Corte-extrusão16 (cut, through all)
    with BuildSketch(Plane.XZ.offset(-22)):
        with Locations((-15, -4.5)):
            Circle(ESBO_O26_R)
    extrude(amount=-CORTE_EXTRUS_O16_DEPTH, mode=Mode.SUBTRACT)

    # Esboço27 → Ressalto-extrusão11 (add)
    with BuildSketch(Plane.XZ.offset(-22)):
        with Locations((-15, -4.5)):
            Circle(ESBO_O27_R)
        with Locations((-15, -4.5)):
            Circle(ESBO_O27_R_2, mode=Mode.SUBTRACT)
    extrude(amount=-RESSALTO_EXTRUS_O11_DEPTH)


solid = part.part
